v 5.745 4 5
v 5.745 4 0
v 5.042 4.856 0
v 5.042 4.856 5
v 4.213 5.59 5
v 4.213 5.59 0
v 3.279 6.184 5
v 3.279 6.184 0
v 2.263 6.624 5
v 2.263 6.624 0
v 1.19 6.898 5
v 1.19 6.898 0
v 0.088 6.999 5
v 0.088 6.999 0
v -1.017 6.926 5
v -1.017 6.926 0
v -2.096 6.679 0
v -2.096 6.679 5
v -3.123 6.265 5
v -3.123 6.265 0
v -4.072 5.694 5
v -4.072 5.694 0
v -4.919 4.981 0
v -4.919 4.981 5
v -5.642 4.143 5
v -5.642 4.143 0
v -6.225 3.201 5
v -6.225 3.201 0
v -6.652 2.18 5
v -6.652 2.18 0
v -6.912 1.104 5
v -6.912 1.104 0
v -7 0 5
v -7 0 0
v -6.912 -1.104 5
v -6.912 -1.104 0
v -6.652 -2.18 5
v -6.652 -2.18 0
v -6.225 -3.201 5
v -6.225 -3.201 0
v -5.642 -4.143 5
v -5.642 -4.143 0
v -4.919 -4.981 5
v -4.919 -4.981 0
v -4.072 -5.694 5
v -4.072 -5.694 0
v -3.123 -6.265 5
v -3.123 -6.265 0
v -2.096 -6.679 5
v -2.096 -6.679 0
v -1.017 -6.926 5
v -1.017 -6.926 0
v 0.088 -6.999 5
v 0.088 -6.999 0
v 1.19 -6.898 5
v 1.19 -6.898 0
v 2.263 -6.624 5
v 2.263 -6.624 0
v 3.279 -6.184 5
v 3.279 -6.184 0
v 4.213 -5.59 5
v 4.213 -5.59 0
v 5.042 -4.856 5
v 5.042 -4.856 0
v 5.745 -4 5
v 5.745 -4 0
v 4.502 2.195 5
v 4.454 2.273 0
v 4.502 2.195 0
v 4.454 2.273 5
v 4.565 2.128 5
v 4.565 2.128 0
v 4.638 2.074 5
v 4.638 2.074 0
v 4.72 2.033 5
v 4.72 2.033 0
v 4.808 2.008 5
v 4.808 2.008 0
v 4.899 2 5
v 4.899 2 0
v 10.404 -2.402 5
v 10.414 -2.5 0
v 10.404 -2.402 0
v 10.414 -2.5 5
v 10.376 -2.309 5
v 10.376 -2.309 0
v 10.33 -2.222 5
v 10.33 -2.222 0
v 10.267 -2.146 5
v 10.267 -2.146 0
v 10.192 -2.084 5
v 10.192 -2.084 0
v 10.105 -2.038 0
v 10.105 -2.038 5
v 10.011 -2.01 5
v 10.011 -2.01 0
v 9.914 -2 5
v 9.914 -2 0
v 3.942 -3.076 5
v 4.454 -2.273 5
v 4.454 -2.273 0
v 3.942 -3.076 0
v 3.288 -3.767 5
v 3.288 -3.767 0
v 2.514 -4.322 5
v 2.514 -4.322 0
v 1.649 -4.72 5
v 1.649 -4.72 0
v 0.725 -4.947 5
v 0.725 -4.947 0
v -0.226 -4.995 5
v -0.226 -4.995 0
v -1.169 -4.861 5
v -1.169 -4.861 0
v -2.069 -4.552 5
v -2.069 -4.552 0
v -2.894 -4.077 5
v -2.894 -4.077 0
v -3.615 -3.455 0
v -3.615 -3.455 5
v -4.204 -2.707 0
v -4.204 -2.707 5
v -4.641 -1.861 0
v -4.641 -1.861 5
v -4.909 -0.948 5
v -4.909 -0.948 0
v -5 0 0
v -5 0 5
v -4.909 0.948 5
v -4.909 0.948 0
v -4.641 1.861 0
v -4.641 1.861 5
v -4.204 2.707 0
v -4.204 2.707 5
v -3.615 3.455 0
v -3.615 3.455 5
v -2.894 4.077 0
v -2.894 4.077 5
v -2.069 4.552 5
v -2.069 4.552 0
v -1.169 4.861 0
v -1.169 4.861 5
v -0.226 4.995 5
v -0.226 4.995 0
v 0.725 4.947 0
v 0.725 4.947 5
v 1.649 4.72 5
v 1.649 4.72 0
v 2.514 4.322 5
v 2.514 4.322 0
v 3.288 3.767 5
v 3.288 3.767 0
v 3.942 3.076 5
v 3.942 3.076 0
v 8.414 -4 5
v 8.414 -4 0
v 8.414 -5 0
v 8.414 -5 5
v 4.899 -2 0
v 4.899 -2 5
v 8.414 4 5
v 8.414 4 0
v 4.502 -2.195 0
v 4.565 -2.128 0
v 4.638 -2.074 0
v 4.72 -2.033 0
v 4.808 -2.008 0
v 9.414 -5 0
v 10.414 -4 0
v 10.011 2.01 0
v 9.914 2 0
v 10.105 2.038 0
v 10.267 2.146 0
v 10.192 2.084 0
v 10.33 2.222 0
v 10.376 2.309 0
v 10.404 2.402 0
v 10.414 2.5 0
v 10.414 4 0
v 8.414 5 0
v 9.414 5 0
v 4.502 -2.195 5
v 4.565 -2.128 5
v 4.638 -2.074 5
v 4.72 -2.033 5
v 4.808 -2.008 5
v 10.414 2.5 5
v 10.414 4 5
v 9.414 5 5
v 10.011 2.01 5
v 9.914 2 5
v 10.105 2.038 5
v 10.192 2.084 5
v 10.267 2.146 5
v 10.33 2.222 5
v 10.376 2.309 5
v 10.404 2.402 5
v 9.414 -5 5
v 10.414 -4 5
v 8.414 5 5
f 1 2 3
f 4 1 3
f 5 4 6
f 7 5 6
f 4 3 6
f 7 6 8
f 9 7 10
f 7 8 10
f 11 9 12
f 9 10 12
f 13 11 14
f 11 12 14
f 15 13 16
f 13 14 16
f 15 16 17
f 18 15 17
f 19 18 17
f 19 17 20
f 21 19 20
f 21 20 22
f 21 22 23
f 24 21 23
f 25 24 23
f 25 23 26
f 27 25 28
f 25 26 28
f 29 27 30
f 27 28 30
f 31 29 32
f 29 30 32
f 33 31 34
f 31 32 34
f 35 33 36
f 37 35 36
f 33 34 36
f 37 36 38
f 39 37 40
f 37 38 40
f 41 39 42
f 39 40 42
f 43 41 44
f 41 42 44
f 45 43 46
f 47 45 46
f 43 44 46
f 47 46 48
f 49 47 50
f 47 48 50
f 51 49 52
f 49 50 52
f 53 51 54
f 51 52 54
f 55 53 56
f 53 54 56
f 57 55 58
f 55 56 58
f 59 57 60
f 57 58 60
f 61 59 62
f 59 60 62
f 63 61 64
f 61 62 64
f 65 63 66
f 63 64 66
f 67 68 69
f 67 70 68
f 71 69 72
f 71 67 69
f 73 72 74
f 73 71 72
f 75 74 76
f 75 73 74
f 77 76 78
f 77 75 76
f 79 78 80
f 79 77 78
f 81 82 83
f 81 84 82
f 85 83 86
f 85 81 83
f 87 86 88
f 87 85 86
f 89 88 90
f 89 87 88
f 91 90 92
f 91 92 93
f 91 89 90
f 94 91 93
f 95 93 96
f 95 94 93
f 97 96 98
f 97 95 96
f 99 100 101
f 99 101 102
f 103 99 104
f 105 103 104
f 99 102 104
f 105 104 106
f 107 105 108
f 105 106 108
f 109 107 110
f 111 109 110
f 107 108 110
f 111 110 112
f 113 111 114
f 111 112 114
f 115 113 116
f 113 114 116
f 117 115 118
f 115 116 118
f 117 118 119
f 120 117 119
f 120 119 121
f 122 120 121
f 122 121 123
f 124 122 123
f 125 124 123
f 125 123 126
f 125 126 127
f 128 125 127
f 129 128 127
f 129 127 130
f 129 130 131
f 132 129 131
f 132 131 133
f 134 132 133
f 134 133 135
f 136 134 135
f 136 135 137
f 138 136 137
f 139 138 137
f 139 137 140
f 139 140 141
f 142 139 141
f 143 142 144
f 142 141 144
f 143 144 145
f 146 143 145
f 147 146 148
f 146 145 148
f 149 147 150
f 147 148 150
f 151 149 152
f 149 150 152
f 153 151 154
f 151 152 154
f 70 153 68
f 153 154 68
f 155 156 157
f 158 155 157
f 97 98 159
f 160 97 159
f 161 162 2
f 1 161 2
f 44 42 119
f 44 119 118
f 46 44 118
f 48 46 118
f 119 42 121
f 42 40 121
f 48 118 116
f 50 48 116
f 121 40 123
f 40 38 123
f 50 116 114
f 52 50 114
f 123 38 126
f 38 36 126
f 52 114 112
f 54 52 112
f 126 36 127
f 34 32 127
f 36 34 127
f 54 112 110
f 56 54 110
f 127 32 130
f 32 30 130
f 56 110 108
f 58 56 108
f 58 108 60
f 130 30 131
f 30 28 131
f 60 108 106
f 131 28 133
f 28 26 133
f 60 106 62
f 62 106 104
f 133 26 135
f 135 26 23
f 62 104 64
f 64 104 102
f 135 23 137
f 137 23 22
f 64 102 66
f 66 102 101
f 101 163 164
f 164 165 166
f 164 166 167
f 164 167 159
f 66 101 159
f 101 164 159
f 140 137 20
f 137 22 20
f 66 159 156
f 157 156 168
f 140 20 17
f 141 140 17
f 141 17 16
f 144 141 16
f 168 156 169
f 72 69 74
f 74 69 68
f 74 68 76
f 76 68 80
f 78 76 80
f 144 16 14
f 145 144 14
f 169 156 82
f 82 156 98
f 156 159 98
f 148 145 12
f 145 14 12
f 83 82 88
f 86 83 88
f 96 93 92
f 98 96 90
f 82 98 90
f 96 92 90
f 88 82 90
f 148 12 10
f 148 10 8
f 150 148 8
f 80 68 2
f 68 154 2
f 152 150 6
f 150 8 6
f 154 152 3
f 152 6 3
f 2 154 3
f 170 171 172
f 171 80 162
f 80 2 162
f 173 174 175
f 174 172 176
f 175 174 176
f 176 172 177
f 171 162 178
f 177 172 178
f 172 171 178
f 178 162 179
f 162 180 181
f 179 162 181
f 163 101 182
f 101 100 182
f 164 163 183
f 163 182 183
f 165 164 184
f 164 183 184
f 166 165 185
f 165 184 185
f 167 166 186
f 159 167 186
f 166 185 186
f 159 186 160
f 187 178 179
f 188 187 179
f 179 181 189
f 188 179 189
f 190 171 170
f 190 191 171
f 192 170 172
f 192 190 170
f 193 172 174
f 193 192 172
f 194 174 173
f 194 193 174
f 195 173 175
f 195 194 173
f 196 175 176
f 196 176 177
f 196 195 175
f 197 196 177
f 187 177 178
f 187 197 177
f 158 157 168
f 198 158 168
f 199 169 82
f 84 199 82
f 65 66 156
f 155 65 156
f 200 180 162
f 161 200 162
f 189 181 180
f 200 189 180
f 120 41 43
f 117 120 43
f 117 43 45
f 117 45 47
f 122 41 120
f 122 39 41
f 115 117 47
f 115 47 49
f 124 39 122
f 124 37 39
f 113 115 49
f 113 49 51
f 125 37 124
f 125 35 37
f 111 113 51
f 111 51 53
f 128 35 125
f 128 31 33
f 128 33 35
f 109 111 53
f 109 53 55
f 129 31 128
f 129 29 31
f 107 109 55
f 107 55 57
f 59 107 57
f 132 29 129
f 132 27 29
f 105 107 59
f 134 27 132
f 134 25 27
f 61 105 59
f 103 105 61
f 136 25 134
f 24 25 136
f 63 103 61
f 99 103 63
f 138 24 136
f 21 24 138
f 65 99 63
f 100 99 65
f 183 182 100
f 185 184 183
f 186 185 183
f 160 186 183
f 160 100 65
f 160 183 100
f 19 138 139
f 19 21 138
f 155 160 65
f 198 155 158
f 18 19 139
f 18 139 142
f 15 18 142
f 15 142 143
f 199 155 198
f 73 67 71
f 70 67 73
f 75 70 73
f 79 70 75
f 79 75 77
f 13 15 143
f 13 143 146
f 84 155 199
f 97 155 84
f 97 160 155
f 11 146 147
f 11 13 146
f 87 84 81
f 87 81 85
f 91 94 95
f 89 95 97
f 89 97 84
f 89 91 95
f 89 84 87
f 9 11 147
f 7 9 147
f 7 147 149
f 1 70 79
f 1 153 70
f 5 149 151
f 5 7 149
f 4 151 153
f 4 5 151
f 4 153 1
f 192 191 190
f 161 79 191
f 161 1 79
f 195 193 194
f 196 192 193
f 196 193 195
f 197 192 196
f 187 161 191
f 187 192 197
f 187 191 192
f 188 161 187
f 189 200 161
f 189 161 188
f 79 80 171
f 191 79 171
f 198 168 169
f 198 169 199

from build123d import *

# Parameters (mm, degrees)
F1_DEPTH = 5
F2_R     = 0.5
F3_SIZE  = 1


with BuildPart() as f1:
    # F0 (on Top) → F1 (new body)
    with BuildSketch(Plane.XY):
        with BuildLine():
            ThreePointArc((4.582576, -2), (-5, 0), (4.582576, 2))
            Line((4.582576, 2), (10.41389, 2))
            Line((10.41389, 2), (10.41389, 5))
            Line((10.41389, 5), (8.41389, 5))
            Line((8.41389, 5), (8.41389, 4))
            Line((8.41389, 4), (5.744563, 4))
            ThreePointArc((5.744563, 4), (-7, 0), (5.744563, -4))
            Line((5.744563, -4), (8.41389, -4))
            Line((8.41389, -4), (8.41389, -5))
            Line((8.41389, -5), (10.41389, -5))
            Line((10.41389, -5), (10.41389, -2))
            Line((10.41389, -2), (4.582576, -2))
        make_face()
    extrude(amount=F1_DEPTH)

    # F2
    f2_edges = [f1.edges().sort_by_distance(p)[0] for p in [
        (10.41389, 2, 2.5),
        (4.582576, 2, 2.5),
        (4.582576, -2, 2.5),
        (10.41389, -2, 2.5),
    ]]
    fillet(f2_edges, radius=F2_R)

    # F3
    f3_edges = [f1.edges().sort_by_distance(p)[0] for p in [
        (10.41389, -5, 2.5),
        (10.41389, 5, 2.5),
    ]]
    chamfer(f3_edges, length=F3_SIZE)


solid = f1.part
